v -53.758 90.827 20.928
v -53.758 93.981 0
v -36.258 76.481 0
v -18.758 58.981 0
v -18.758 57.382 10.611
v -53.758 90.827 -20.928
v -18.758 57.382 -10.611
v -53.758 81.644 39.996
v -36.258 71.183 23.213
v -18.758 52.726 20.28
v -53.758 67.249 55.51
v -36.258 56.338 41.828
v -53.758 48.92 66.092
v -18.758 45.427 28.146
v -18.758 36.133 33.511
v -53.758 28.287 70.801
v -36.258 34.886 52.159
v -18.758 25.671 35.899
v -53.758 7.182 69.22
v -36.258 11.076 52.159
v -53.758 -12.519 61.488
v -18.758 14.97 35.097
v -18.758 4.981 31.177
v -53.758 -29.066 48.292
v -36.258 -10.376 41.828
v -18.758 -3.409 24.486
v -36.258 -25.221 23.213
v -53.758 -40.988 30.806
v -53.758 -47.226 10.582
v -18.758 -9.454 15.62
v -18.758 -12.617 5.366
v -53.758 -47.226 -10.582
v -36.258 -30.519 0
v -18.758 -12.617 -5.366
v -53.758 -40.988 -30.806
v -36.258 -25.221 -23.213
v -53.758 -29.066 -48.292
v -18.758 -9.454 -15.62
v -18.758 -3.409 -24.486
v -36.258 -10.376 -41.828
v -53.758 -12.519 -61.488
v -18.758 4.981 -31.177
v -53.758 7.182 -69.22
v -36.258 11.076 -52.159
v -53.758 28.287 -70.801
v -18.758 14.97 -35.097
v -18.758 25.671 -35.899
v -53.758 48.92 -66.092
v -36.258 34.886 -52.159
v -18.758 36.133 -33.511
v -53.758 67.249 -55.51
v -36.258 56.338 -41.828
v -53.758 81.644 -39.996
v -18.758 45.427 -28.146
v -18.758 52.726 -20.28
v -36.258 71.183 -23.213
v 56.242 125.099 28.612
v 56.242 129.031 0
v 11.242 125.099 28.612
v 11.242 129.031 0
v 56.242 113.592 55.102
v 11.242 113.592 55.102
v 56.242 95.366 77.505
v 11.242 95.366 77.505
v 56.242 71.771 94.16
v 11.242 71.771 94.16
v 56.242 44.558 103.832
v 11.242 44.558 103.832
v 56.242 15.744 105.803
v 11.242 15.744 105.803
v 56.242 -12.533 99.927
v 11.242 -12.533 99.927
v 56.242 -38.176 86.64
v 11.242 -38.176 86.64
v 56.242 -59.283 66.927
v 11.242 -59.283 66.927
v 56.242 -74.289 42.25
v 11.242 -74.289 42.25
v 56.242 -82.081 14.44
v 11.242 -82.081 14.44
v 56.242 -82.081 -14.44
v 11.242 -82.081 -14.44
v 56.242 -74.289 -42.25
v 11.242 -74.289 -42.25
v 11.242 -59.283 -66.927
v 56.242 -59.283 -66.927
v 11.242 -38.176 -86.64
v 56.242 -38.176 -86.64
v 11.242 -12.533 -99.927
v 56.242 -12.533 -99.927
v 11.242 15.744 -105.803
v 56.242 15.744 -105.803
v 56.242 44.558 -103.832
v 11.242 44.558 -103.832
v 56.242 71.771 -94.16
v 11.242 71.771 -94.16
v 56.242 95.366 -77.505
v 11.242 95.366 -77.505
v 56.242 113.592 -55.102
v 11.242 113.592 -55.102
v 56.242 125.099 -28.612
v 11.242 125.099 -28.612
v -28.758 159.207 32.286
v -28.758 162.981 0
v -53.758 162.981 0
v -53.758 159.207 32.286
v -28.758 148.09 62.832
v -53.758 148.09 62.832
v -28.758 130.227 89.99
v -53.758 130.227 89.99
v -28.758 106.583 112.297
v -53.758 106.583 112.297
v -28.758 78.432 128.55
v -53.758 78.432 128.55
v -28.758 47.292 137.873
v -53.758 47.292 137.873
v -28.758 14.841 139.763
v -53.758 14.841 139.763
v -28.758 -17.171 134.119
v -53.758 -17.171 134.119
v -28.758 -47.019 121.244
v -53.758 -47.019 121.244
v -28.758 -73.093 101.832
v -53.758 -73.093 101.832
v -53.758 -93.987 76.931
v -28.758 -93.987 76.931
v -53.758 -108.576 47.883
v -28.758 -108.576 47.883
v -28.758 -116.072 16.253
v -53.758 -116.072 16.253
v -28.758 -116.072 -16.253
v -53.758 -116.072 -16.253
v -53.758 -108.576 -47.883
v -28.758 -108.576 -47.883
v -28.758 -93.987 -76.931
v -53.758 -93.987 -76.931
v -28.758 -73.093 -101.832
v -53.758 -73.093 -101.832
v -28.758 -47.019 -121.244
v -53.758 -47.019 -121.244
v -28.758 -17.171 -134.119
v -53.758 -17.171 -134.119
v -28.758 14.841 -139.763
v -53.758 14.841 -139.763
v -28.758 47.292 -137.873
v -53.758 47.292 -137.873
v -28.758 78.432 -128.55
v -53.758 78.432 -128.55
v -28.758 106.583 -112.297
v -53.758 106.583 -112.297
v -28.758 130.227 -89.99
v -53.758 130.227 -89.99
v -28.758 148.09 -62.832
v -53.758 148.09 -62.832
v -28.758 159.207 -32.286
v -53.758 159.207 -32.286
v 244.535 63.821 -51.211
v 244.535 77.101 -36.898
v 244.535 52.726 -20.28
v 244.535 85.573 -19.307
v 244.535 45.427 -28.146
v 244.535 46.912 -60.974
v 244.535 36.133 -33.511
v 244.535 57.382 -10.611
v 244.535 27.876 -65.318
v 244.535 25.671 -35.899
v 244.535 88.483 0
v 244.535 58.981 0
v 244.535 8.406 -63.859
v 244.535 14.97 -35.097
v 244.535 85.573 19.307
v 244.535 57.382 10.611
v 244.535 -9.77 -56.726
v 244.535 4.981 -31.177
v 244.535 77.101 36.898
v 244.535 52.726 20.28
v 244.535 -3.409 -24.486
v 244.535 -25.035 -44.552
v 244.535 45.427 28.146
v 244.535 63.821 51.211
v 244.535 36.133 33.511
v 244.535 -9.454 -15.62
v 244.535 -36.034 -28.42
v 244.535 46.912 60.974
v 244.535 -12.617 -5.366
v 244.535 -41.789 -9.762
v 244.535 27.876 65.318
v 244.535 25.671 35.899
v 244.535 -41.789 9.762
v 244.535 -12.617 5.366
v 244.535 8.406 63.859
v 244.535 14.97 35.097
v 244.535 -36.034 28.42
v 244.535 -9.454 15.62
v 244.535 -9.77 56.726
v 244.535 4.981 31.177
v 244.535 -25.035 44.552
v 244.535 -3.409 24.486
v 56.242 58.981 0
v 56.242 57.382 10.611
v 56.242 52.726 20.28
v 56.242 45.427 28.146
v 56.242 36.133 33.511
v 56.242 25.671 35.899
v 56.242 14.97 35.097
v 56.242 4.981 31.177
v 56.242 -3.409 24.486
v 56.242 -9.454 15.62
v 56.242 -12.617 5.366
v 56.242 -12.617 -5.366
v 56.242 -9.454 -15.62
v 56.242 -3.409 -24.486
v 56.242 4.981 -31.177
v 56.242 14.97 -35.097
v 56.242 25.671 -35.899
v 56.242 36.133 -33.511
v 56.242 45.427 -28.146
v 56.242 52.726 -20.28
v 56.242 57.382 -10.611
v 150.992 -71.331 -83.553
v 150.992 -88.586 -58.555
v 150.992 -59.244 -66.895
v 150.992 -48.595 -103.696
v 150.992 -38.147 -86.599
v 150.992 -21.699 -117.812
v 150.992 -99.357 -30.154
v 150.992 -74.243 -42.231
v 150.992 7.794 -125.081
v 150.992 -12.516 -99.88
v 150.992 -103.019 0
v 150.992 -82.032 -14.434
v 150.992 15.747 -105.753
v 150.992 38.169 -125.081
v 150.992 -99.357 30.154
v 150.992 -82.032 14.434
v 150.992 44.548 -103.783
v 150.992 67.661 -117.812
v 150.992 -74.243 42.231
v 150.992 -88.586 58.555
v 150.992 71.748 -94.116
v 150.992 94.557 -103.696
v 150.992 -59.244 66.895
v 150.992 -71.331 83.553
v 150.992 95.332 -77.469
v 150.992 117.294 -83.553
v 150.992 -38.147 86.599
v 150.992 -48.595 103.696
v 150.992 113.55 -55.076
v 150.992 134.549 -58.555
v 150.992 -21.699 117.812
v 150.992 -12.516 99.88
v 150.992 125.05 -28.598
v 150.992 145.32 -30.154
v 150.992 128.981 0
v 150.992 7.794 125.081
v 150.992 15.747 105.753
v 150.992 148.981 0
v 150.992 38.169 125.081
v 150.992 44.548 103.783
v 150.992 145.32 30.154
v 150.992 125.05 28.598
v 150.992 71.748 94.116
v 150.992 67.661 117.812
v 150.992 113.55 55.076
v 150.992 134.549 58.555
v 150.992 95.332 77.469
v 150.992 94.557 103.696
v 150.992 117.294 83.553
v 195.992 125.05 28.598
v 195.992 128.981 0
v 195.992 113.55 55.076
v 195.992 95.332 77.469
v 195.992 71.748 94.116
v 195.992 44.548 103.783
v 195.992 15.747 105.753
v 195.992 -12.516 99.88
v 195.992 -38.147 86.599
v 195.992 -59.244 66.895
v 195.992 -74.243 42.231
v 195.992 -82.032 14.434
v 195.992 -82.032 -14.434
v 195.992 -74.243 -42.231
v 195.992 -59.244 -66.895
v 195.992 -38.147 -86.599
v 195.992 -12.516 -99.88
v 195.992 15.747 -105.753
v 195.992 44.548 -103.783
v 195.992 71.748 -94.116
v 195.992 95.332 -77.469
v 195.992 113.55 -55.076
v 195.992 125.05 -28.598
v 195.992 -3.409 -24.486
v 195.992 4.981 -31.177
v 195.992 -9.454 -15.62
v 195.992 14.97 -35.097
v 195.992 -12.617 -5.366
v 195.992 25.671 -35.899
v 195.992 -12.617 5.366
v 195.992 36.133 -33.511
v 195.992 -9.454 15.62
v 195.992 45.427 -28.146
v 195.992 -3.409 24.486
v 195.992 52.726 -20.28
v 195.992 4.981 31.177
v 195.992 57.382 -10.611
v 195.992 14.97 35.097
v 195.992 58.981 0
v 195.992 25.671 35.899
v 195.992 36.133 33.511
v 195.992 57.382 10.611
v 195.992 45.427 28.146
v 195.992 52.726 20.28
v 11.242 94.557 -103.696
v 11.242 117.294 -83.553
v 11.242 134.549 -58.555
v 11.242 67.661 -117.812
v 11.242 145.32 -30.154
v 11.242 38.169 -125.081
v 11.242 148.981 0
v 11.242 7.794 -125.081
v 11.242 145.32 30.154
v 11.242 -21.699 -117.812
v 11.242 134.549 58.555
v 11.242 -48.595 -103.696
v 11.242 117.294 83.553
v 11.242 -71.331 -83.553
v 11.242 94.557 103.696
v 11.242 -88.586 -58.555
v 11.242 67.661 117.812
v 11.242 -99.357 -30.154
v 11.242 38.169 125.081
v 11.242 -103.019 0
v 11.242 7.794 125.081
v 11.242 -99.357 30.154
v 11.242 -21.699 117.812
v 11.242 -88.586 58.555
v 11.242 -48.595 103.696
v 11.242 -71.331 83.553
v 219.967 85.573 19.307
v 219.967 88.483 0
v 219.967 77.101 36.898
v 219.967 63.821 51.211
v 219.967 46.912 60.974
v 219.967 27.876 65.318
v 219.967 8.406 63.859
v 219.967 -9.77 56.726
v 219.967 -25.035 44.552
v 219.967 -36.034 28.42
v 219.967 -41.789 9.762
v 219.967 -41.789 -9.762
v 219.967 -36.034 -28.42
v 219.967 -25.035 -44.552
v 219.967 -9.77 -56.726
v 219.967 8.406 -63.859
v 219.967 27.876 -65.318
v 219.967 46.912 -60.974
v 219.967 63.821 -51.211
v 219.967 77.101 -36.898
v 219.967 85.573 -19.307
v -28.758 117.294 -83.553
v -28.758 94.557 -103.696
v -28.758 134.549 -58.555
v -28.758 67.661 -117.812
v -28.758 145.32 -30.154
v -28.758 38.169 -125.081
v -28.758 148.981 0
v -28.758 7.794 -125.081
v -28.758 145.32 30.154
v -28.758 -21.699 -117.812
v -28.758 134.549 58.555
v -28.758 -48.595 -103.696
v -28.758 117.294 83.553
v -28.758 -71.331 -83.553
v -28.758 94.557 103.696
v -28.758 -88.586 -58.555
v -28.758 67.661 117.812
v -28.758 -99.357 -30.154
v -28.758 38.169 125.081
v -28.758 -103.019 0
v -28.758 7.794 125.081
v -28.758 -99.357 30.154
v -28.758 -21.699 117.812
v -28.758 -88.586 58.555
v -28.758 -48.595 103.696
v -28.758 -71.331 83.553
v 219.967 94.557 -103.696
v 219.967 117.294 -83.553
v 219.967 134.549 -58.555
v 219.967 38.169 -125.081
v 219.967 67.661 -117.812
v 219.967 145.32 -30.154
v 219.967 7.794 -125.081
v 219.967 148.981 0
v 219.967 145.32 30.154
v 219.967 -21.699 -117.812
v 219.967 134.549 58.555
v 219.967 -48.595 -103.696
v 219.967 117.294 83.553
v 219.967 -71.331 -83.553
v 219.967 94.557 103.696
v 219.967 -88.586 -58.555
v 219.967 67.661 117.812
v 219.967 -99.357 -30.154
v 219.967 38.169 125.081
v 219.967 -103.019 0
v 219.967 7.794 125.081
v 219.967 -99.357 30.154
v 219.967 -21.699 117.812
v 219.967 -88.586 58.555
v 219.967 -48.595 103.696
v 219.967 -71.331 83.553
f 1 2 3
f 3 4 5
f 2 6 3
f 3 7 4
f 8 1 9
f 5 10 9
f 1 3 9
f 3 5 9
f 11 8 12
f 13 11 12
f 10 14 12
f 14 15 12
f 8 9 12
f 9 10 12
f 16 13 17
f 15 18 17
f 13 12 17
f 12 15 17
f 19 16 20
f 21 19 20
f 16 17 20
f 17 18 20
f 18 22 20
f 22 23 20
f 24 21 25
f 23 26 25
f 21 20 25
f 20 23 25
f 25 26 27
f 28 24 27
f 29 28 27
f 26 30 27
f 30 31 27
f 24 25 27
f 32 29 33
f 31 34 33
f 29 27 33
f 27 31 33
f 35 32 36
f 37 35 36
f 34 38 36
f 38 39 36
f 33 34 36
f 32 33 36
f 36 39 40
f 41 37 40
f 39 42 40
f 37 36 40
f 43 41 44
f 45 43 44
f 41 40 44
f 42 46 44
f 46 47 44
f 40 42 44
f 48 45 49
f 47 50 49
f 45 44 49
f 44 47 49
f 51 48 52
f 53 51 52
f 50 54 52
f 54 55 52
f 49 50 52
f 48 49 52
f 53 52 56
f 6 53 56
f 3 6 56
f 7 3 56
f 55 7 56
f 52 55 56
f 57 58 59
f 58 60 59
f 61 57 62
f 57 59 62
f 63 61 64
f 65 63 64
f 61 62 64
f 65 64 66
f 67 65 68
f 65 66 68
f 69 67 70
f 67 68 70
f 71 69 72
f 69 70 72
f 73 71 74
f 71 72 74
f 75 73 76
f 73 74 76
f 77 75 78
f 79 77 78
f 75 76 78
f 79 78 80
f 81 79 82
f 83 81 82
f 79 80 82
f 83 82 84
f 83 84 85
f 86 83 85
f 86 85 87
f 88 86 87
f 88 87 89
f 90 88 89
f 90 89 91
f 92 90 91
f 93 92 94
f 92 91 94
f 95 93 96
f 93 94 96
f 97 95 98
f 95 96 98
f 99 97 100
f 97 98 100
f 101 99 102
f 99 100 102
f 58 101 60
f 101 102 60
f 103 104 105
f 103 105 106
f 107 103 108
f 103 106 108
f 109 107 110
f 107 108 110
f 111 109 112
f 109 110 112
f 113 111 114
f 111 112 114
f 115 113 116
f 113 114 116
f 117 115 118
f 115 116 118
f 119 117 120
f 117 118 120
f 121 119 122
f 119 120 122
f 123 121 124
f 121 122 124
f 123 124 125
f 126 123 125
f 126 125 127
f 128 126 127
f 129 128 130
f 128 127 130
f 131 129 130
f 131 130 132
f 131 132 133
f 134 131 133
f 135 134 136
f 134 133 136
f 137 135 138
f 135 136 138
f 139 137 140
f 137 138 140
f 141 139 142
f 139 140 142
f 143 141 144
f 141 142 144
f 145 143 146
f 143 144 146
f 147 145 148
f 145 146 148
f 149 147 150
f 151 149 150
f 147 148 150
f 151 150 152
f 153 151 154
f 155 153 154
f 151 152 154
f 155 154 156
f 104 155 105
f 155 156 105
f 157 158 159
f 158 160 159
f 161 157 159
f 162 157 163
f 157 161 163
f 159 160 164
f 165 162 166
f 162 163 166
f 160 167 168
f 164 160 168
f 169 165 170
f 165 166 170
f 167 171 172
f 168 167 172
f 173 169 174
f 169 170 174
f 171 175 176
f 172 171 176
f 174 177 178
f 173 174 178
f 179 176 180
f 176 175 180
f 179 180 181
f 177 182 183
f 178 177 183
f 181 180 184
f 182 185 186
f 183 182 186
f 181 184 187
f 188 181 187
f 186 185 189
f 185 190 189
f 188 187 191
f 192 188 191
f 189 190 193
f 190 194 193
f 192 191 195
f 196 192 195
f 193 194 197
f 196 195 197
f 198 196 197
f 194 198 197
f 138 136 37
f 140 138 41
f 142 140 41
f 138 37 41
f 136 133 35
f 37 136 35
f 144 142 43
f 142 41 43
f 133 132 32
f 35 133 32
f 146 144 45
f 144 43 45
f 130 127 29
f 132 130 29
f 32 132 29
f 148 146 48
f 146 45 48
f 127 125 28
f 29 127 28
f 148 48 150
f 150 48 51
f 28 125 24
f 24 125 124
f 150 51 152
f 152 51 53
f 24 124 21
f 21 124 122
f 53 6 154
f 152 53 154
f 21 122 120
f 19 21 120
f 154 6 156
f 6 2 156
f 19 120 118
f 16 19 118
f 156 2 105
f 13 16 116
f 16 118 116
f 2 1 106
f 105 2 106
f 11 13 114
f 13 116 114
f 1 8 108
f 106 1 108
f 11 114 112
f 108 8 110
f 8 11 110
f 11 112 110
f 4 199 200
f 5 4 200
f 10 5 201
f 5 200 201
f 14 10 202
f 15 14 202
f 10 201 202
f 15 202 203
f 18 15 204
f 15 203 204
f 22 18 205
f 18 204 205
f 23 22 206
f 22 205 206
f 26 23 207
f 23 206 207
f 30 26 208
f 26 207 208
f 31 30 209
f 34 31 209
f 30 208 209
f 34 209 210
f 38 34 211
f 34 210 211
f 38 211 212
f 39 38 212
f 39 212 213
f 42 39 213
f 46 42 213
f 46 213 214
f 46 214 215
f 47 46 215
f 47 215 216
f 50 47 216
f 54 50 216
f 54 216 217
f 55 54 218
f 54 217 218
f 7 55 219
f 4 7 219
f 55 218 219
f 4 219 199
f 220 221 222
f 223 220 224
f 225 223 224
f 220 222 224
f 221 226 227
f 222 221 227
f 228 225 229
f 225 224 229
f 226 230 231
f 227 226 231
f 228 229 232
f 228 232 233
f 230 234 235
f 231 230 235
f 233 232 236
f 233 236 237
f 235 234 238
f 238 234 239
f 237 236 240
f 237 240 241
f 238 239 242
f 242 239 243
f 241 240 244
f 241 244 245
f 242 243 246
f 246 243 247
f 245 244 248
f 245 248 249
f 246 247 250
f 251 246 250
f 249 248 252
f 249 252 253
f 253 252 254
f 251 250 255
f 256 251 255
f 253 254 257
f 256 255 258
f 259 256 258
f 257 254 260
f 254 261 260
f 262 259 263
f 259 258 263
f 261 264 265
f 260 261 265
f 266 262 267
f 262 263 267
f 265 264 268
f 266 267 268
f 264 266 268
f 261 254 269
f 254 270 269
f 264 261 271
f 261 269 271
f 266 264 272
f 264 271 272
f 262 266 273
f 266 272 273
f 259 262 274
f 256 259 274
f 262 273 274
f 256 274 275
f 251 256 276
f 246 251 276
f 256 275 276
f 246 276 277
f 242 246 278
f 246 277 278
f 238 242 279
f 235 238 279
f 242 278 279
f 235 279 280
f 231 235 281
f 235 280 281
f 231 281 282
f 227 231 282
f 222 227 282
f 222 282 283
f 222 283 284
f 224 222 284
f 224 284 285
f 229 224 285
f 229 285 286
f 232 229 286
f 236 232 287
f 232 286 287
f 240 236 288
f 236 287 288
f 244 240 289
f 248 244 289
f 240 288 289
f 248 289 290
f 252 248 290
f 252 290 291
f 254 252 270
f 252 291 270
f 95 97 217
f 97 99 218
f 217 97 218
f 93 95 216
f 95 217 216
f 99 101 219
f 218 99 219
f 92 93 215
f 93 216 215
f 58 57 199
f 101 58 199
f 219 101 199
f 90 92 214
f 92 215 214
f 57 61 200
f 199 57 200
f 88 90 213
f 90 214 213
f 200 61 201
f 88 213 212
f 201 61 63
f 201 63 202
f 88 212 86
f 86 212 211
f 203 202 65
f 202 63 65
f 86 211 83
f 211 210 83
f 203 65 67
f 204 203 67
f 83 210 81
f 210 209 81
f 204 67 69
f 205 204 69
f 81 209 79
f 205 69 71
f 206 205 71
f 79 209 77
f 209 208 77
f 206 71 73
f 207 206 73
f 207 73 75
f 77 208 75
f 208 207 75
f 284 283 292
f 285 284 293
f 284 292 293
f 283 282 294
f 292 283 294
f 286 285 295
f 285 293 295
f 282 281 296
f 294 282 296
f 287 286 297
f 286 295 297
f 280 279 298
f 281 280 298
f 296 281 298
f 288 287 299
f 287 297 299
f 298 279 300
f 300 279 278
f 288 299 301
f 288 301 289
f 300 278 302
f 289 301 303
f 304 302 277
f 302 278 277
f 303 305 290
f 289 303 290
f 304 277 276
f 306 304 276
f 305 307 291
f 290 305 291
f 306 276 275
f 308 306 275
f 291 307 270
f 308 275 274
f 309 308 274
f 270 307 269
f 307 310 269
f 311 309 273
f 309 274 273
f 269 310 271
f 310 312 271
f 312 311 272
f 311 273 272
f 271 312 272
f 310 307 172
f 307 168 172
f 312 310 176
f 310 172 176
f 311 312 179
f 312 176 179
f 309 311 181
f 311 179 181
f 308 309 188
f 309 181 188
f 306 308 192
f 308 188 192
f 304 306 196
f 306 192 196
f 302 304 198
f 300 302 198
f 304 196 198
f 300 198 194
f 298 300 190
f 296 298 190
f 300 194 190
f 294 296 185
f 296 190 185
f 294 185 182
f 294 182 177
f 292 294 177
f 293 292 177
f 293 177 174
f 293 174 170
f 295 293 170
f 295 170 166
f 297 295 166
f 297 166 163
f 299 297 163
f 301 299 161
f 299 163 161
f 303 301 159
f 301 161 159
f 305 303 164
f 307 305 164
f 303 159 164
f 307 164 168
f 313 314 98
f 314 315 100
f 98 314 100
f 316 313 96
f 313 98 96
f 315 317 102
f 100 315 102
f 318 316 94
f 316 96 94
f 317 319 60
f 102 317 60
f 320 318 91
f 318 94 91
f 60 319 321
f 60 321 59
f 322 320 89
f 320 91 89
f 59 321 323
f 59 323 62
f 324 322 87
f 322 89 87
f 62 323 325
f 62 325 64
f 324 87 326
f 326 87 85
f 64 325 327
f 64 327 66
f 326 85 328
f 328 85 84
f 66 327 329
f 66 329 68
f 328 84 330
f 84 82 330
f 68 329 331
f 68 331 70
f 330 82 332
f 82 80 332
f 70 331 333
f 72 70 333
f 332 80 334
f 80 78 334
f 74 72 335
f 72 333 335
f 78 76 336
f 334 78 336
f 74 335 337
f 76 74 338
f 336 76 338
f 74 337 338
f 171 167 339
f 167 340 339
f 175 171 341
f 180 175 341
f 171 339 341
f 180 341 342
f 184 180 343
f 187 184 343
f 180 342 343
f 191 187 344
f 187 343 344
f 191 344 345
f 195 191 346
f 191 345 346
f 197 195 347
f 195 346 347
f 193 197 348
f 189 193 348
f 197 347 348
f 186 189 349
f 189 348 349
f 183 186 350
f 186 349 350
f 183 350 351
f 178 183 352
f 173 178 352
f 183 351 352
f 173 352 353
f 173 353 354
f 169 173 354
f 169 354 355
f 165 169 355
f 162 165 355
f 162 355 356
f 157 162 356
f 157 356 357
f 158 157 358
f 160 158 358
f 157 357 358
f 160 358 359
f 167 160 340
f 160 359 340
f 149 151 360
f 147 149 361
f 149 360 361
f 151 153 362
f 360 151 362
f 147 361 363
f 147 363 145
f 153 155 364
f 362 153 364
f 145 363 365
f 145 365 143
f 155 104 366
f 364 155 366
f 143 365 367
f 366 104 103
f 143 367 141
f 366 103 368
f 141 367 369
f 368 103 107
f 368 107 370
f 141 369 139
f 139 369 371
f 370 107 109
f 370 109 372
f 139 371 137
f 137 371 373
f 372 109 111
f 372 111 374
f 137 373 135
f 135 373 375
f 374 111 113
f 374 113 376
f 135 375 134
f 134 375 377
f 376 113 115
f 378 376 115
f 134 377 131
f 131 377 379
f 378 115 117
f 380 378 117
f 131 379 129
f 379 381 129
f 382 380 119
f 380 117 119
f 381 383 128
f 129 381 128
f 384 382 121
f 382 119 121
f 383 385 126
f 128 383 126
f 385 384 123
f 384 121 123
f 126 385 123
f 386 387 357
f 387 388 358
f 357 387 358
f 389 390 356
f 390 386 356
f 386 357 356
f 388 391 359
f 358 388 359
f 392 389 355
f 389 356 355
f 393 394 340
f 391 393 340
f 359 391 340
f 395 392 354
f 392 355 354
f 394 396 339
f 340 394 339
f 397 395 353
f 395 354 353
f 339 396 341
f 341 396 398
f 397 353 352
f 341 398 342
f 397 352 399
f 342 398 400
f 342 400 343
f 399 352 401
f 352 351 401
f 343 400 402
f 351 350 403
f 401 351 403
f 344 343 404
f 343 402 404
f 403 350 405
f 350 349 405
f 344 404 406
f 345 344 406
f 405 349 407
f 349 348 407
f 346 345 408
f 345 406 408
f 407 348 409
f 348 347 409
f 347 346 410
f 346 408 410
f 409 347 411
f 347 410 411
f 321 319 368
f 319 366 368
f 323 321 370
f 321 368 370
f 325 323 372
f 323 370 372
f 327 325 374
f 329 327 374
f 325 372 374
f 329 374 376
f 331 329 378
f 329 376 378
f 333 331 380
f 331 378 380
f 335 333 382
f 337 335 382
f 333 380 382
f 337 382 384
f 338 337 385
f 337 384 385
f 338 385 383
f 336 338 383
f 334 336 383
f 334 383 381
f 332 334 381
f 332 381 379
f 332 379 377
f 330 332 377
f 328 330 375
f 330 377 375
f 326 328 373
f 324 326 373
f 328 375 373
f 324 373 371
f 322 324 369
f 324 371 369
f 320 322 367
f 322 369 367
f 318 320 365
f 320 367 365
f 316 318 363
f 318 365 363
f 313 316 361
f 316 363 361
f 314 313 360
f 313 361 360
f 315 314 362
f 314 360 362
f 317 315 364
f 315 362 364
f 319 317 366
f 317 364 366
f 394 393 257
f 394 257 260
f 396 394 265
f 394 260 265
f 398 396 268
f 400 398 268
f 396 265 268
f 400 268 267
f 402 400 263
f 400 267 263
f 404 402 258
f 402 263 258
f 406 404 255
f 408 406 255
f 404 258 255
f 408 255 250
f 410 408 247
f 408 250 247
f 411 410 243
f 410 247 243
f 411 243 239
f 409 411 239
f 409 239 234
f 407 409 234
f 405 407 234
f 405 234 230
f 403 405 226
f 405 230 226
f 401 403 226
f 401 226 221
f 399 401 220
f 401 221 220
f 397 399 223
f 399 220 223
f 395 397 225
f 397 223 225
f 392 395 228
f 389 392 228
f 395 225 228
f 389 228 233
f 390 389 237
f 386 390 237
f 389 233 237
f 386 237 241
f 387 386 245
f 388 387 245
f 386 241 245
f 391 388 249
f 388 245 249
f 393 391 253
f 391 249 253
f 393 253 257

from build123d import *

# Parameters (mm, degrees)
F3_SIZE = 35


with BuildPart() as f1:
    # F0 (on Top) → F1 (revolve)
    with BuildSketch(Plane.XY):
        Polygon((-53.757738322, 162.981180191), (-53.757738322, 58.981180191), (56.242261678, 58.981180191), (56.242261678, 109.081180191), (56.242261678, 129.031180191), (11.242261678, 129.031180191), (11.242261678, 148.981180191), (-28.757738322, 148.981180191), (-28.757738322, 162.981180191), align=None)
    revolve(axis=Axis((-73.0837285519, 22.981180191, 0), (1, 0, 0)))

    # F3
    f3_edges = [f1.edges().sort_by_distance(p)[0] for p in [
        (-53.757738, -13.01882, 0),
    ]]
    chamfer(f3_edges, length=F3_SIZE)


with BuildPart() as f2:
    # F0 (on Top) → F2 (revolve)
    with BuildSketch(Plane.XY):
        Polygon((195.9919762611, 128.981180191), (195.9919762611, 58.981180191), (219.9965119362, 58.981180191), (244.5349097252, 58.981180191), (244.5349097252, 88.4826818109), (219.966635108, 88.4826818109), (219.966635108, 128.981180191), align=None)
        Polygon((150.9919762611, 128.981180191), (195.9919762611, 128.981180191), (219.966635108, 128.981180191), (219.966635108, 148.981180191), (150.9919762611, 148.981180191), align=None)
    revolve(axis=Axis((56.242261678, 22.981180191, 0), (1, 0, 0)))


solid = Compound([f1.part, f2.part])
